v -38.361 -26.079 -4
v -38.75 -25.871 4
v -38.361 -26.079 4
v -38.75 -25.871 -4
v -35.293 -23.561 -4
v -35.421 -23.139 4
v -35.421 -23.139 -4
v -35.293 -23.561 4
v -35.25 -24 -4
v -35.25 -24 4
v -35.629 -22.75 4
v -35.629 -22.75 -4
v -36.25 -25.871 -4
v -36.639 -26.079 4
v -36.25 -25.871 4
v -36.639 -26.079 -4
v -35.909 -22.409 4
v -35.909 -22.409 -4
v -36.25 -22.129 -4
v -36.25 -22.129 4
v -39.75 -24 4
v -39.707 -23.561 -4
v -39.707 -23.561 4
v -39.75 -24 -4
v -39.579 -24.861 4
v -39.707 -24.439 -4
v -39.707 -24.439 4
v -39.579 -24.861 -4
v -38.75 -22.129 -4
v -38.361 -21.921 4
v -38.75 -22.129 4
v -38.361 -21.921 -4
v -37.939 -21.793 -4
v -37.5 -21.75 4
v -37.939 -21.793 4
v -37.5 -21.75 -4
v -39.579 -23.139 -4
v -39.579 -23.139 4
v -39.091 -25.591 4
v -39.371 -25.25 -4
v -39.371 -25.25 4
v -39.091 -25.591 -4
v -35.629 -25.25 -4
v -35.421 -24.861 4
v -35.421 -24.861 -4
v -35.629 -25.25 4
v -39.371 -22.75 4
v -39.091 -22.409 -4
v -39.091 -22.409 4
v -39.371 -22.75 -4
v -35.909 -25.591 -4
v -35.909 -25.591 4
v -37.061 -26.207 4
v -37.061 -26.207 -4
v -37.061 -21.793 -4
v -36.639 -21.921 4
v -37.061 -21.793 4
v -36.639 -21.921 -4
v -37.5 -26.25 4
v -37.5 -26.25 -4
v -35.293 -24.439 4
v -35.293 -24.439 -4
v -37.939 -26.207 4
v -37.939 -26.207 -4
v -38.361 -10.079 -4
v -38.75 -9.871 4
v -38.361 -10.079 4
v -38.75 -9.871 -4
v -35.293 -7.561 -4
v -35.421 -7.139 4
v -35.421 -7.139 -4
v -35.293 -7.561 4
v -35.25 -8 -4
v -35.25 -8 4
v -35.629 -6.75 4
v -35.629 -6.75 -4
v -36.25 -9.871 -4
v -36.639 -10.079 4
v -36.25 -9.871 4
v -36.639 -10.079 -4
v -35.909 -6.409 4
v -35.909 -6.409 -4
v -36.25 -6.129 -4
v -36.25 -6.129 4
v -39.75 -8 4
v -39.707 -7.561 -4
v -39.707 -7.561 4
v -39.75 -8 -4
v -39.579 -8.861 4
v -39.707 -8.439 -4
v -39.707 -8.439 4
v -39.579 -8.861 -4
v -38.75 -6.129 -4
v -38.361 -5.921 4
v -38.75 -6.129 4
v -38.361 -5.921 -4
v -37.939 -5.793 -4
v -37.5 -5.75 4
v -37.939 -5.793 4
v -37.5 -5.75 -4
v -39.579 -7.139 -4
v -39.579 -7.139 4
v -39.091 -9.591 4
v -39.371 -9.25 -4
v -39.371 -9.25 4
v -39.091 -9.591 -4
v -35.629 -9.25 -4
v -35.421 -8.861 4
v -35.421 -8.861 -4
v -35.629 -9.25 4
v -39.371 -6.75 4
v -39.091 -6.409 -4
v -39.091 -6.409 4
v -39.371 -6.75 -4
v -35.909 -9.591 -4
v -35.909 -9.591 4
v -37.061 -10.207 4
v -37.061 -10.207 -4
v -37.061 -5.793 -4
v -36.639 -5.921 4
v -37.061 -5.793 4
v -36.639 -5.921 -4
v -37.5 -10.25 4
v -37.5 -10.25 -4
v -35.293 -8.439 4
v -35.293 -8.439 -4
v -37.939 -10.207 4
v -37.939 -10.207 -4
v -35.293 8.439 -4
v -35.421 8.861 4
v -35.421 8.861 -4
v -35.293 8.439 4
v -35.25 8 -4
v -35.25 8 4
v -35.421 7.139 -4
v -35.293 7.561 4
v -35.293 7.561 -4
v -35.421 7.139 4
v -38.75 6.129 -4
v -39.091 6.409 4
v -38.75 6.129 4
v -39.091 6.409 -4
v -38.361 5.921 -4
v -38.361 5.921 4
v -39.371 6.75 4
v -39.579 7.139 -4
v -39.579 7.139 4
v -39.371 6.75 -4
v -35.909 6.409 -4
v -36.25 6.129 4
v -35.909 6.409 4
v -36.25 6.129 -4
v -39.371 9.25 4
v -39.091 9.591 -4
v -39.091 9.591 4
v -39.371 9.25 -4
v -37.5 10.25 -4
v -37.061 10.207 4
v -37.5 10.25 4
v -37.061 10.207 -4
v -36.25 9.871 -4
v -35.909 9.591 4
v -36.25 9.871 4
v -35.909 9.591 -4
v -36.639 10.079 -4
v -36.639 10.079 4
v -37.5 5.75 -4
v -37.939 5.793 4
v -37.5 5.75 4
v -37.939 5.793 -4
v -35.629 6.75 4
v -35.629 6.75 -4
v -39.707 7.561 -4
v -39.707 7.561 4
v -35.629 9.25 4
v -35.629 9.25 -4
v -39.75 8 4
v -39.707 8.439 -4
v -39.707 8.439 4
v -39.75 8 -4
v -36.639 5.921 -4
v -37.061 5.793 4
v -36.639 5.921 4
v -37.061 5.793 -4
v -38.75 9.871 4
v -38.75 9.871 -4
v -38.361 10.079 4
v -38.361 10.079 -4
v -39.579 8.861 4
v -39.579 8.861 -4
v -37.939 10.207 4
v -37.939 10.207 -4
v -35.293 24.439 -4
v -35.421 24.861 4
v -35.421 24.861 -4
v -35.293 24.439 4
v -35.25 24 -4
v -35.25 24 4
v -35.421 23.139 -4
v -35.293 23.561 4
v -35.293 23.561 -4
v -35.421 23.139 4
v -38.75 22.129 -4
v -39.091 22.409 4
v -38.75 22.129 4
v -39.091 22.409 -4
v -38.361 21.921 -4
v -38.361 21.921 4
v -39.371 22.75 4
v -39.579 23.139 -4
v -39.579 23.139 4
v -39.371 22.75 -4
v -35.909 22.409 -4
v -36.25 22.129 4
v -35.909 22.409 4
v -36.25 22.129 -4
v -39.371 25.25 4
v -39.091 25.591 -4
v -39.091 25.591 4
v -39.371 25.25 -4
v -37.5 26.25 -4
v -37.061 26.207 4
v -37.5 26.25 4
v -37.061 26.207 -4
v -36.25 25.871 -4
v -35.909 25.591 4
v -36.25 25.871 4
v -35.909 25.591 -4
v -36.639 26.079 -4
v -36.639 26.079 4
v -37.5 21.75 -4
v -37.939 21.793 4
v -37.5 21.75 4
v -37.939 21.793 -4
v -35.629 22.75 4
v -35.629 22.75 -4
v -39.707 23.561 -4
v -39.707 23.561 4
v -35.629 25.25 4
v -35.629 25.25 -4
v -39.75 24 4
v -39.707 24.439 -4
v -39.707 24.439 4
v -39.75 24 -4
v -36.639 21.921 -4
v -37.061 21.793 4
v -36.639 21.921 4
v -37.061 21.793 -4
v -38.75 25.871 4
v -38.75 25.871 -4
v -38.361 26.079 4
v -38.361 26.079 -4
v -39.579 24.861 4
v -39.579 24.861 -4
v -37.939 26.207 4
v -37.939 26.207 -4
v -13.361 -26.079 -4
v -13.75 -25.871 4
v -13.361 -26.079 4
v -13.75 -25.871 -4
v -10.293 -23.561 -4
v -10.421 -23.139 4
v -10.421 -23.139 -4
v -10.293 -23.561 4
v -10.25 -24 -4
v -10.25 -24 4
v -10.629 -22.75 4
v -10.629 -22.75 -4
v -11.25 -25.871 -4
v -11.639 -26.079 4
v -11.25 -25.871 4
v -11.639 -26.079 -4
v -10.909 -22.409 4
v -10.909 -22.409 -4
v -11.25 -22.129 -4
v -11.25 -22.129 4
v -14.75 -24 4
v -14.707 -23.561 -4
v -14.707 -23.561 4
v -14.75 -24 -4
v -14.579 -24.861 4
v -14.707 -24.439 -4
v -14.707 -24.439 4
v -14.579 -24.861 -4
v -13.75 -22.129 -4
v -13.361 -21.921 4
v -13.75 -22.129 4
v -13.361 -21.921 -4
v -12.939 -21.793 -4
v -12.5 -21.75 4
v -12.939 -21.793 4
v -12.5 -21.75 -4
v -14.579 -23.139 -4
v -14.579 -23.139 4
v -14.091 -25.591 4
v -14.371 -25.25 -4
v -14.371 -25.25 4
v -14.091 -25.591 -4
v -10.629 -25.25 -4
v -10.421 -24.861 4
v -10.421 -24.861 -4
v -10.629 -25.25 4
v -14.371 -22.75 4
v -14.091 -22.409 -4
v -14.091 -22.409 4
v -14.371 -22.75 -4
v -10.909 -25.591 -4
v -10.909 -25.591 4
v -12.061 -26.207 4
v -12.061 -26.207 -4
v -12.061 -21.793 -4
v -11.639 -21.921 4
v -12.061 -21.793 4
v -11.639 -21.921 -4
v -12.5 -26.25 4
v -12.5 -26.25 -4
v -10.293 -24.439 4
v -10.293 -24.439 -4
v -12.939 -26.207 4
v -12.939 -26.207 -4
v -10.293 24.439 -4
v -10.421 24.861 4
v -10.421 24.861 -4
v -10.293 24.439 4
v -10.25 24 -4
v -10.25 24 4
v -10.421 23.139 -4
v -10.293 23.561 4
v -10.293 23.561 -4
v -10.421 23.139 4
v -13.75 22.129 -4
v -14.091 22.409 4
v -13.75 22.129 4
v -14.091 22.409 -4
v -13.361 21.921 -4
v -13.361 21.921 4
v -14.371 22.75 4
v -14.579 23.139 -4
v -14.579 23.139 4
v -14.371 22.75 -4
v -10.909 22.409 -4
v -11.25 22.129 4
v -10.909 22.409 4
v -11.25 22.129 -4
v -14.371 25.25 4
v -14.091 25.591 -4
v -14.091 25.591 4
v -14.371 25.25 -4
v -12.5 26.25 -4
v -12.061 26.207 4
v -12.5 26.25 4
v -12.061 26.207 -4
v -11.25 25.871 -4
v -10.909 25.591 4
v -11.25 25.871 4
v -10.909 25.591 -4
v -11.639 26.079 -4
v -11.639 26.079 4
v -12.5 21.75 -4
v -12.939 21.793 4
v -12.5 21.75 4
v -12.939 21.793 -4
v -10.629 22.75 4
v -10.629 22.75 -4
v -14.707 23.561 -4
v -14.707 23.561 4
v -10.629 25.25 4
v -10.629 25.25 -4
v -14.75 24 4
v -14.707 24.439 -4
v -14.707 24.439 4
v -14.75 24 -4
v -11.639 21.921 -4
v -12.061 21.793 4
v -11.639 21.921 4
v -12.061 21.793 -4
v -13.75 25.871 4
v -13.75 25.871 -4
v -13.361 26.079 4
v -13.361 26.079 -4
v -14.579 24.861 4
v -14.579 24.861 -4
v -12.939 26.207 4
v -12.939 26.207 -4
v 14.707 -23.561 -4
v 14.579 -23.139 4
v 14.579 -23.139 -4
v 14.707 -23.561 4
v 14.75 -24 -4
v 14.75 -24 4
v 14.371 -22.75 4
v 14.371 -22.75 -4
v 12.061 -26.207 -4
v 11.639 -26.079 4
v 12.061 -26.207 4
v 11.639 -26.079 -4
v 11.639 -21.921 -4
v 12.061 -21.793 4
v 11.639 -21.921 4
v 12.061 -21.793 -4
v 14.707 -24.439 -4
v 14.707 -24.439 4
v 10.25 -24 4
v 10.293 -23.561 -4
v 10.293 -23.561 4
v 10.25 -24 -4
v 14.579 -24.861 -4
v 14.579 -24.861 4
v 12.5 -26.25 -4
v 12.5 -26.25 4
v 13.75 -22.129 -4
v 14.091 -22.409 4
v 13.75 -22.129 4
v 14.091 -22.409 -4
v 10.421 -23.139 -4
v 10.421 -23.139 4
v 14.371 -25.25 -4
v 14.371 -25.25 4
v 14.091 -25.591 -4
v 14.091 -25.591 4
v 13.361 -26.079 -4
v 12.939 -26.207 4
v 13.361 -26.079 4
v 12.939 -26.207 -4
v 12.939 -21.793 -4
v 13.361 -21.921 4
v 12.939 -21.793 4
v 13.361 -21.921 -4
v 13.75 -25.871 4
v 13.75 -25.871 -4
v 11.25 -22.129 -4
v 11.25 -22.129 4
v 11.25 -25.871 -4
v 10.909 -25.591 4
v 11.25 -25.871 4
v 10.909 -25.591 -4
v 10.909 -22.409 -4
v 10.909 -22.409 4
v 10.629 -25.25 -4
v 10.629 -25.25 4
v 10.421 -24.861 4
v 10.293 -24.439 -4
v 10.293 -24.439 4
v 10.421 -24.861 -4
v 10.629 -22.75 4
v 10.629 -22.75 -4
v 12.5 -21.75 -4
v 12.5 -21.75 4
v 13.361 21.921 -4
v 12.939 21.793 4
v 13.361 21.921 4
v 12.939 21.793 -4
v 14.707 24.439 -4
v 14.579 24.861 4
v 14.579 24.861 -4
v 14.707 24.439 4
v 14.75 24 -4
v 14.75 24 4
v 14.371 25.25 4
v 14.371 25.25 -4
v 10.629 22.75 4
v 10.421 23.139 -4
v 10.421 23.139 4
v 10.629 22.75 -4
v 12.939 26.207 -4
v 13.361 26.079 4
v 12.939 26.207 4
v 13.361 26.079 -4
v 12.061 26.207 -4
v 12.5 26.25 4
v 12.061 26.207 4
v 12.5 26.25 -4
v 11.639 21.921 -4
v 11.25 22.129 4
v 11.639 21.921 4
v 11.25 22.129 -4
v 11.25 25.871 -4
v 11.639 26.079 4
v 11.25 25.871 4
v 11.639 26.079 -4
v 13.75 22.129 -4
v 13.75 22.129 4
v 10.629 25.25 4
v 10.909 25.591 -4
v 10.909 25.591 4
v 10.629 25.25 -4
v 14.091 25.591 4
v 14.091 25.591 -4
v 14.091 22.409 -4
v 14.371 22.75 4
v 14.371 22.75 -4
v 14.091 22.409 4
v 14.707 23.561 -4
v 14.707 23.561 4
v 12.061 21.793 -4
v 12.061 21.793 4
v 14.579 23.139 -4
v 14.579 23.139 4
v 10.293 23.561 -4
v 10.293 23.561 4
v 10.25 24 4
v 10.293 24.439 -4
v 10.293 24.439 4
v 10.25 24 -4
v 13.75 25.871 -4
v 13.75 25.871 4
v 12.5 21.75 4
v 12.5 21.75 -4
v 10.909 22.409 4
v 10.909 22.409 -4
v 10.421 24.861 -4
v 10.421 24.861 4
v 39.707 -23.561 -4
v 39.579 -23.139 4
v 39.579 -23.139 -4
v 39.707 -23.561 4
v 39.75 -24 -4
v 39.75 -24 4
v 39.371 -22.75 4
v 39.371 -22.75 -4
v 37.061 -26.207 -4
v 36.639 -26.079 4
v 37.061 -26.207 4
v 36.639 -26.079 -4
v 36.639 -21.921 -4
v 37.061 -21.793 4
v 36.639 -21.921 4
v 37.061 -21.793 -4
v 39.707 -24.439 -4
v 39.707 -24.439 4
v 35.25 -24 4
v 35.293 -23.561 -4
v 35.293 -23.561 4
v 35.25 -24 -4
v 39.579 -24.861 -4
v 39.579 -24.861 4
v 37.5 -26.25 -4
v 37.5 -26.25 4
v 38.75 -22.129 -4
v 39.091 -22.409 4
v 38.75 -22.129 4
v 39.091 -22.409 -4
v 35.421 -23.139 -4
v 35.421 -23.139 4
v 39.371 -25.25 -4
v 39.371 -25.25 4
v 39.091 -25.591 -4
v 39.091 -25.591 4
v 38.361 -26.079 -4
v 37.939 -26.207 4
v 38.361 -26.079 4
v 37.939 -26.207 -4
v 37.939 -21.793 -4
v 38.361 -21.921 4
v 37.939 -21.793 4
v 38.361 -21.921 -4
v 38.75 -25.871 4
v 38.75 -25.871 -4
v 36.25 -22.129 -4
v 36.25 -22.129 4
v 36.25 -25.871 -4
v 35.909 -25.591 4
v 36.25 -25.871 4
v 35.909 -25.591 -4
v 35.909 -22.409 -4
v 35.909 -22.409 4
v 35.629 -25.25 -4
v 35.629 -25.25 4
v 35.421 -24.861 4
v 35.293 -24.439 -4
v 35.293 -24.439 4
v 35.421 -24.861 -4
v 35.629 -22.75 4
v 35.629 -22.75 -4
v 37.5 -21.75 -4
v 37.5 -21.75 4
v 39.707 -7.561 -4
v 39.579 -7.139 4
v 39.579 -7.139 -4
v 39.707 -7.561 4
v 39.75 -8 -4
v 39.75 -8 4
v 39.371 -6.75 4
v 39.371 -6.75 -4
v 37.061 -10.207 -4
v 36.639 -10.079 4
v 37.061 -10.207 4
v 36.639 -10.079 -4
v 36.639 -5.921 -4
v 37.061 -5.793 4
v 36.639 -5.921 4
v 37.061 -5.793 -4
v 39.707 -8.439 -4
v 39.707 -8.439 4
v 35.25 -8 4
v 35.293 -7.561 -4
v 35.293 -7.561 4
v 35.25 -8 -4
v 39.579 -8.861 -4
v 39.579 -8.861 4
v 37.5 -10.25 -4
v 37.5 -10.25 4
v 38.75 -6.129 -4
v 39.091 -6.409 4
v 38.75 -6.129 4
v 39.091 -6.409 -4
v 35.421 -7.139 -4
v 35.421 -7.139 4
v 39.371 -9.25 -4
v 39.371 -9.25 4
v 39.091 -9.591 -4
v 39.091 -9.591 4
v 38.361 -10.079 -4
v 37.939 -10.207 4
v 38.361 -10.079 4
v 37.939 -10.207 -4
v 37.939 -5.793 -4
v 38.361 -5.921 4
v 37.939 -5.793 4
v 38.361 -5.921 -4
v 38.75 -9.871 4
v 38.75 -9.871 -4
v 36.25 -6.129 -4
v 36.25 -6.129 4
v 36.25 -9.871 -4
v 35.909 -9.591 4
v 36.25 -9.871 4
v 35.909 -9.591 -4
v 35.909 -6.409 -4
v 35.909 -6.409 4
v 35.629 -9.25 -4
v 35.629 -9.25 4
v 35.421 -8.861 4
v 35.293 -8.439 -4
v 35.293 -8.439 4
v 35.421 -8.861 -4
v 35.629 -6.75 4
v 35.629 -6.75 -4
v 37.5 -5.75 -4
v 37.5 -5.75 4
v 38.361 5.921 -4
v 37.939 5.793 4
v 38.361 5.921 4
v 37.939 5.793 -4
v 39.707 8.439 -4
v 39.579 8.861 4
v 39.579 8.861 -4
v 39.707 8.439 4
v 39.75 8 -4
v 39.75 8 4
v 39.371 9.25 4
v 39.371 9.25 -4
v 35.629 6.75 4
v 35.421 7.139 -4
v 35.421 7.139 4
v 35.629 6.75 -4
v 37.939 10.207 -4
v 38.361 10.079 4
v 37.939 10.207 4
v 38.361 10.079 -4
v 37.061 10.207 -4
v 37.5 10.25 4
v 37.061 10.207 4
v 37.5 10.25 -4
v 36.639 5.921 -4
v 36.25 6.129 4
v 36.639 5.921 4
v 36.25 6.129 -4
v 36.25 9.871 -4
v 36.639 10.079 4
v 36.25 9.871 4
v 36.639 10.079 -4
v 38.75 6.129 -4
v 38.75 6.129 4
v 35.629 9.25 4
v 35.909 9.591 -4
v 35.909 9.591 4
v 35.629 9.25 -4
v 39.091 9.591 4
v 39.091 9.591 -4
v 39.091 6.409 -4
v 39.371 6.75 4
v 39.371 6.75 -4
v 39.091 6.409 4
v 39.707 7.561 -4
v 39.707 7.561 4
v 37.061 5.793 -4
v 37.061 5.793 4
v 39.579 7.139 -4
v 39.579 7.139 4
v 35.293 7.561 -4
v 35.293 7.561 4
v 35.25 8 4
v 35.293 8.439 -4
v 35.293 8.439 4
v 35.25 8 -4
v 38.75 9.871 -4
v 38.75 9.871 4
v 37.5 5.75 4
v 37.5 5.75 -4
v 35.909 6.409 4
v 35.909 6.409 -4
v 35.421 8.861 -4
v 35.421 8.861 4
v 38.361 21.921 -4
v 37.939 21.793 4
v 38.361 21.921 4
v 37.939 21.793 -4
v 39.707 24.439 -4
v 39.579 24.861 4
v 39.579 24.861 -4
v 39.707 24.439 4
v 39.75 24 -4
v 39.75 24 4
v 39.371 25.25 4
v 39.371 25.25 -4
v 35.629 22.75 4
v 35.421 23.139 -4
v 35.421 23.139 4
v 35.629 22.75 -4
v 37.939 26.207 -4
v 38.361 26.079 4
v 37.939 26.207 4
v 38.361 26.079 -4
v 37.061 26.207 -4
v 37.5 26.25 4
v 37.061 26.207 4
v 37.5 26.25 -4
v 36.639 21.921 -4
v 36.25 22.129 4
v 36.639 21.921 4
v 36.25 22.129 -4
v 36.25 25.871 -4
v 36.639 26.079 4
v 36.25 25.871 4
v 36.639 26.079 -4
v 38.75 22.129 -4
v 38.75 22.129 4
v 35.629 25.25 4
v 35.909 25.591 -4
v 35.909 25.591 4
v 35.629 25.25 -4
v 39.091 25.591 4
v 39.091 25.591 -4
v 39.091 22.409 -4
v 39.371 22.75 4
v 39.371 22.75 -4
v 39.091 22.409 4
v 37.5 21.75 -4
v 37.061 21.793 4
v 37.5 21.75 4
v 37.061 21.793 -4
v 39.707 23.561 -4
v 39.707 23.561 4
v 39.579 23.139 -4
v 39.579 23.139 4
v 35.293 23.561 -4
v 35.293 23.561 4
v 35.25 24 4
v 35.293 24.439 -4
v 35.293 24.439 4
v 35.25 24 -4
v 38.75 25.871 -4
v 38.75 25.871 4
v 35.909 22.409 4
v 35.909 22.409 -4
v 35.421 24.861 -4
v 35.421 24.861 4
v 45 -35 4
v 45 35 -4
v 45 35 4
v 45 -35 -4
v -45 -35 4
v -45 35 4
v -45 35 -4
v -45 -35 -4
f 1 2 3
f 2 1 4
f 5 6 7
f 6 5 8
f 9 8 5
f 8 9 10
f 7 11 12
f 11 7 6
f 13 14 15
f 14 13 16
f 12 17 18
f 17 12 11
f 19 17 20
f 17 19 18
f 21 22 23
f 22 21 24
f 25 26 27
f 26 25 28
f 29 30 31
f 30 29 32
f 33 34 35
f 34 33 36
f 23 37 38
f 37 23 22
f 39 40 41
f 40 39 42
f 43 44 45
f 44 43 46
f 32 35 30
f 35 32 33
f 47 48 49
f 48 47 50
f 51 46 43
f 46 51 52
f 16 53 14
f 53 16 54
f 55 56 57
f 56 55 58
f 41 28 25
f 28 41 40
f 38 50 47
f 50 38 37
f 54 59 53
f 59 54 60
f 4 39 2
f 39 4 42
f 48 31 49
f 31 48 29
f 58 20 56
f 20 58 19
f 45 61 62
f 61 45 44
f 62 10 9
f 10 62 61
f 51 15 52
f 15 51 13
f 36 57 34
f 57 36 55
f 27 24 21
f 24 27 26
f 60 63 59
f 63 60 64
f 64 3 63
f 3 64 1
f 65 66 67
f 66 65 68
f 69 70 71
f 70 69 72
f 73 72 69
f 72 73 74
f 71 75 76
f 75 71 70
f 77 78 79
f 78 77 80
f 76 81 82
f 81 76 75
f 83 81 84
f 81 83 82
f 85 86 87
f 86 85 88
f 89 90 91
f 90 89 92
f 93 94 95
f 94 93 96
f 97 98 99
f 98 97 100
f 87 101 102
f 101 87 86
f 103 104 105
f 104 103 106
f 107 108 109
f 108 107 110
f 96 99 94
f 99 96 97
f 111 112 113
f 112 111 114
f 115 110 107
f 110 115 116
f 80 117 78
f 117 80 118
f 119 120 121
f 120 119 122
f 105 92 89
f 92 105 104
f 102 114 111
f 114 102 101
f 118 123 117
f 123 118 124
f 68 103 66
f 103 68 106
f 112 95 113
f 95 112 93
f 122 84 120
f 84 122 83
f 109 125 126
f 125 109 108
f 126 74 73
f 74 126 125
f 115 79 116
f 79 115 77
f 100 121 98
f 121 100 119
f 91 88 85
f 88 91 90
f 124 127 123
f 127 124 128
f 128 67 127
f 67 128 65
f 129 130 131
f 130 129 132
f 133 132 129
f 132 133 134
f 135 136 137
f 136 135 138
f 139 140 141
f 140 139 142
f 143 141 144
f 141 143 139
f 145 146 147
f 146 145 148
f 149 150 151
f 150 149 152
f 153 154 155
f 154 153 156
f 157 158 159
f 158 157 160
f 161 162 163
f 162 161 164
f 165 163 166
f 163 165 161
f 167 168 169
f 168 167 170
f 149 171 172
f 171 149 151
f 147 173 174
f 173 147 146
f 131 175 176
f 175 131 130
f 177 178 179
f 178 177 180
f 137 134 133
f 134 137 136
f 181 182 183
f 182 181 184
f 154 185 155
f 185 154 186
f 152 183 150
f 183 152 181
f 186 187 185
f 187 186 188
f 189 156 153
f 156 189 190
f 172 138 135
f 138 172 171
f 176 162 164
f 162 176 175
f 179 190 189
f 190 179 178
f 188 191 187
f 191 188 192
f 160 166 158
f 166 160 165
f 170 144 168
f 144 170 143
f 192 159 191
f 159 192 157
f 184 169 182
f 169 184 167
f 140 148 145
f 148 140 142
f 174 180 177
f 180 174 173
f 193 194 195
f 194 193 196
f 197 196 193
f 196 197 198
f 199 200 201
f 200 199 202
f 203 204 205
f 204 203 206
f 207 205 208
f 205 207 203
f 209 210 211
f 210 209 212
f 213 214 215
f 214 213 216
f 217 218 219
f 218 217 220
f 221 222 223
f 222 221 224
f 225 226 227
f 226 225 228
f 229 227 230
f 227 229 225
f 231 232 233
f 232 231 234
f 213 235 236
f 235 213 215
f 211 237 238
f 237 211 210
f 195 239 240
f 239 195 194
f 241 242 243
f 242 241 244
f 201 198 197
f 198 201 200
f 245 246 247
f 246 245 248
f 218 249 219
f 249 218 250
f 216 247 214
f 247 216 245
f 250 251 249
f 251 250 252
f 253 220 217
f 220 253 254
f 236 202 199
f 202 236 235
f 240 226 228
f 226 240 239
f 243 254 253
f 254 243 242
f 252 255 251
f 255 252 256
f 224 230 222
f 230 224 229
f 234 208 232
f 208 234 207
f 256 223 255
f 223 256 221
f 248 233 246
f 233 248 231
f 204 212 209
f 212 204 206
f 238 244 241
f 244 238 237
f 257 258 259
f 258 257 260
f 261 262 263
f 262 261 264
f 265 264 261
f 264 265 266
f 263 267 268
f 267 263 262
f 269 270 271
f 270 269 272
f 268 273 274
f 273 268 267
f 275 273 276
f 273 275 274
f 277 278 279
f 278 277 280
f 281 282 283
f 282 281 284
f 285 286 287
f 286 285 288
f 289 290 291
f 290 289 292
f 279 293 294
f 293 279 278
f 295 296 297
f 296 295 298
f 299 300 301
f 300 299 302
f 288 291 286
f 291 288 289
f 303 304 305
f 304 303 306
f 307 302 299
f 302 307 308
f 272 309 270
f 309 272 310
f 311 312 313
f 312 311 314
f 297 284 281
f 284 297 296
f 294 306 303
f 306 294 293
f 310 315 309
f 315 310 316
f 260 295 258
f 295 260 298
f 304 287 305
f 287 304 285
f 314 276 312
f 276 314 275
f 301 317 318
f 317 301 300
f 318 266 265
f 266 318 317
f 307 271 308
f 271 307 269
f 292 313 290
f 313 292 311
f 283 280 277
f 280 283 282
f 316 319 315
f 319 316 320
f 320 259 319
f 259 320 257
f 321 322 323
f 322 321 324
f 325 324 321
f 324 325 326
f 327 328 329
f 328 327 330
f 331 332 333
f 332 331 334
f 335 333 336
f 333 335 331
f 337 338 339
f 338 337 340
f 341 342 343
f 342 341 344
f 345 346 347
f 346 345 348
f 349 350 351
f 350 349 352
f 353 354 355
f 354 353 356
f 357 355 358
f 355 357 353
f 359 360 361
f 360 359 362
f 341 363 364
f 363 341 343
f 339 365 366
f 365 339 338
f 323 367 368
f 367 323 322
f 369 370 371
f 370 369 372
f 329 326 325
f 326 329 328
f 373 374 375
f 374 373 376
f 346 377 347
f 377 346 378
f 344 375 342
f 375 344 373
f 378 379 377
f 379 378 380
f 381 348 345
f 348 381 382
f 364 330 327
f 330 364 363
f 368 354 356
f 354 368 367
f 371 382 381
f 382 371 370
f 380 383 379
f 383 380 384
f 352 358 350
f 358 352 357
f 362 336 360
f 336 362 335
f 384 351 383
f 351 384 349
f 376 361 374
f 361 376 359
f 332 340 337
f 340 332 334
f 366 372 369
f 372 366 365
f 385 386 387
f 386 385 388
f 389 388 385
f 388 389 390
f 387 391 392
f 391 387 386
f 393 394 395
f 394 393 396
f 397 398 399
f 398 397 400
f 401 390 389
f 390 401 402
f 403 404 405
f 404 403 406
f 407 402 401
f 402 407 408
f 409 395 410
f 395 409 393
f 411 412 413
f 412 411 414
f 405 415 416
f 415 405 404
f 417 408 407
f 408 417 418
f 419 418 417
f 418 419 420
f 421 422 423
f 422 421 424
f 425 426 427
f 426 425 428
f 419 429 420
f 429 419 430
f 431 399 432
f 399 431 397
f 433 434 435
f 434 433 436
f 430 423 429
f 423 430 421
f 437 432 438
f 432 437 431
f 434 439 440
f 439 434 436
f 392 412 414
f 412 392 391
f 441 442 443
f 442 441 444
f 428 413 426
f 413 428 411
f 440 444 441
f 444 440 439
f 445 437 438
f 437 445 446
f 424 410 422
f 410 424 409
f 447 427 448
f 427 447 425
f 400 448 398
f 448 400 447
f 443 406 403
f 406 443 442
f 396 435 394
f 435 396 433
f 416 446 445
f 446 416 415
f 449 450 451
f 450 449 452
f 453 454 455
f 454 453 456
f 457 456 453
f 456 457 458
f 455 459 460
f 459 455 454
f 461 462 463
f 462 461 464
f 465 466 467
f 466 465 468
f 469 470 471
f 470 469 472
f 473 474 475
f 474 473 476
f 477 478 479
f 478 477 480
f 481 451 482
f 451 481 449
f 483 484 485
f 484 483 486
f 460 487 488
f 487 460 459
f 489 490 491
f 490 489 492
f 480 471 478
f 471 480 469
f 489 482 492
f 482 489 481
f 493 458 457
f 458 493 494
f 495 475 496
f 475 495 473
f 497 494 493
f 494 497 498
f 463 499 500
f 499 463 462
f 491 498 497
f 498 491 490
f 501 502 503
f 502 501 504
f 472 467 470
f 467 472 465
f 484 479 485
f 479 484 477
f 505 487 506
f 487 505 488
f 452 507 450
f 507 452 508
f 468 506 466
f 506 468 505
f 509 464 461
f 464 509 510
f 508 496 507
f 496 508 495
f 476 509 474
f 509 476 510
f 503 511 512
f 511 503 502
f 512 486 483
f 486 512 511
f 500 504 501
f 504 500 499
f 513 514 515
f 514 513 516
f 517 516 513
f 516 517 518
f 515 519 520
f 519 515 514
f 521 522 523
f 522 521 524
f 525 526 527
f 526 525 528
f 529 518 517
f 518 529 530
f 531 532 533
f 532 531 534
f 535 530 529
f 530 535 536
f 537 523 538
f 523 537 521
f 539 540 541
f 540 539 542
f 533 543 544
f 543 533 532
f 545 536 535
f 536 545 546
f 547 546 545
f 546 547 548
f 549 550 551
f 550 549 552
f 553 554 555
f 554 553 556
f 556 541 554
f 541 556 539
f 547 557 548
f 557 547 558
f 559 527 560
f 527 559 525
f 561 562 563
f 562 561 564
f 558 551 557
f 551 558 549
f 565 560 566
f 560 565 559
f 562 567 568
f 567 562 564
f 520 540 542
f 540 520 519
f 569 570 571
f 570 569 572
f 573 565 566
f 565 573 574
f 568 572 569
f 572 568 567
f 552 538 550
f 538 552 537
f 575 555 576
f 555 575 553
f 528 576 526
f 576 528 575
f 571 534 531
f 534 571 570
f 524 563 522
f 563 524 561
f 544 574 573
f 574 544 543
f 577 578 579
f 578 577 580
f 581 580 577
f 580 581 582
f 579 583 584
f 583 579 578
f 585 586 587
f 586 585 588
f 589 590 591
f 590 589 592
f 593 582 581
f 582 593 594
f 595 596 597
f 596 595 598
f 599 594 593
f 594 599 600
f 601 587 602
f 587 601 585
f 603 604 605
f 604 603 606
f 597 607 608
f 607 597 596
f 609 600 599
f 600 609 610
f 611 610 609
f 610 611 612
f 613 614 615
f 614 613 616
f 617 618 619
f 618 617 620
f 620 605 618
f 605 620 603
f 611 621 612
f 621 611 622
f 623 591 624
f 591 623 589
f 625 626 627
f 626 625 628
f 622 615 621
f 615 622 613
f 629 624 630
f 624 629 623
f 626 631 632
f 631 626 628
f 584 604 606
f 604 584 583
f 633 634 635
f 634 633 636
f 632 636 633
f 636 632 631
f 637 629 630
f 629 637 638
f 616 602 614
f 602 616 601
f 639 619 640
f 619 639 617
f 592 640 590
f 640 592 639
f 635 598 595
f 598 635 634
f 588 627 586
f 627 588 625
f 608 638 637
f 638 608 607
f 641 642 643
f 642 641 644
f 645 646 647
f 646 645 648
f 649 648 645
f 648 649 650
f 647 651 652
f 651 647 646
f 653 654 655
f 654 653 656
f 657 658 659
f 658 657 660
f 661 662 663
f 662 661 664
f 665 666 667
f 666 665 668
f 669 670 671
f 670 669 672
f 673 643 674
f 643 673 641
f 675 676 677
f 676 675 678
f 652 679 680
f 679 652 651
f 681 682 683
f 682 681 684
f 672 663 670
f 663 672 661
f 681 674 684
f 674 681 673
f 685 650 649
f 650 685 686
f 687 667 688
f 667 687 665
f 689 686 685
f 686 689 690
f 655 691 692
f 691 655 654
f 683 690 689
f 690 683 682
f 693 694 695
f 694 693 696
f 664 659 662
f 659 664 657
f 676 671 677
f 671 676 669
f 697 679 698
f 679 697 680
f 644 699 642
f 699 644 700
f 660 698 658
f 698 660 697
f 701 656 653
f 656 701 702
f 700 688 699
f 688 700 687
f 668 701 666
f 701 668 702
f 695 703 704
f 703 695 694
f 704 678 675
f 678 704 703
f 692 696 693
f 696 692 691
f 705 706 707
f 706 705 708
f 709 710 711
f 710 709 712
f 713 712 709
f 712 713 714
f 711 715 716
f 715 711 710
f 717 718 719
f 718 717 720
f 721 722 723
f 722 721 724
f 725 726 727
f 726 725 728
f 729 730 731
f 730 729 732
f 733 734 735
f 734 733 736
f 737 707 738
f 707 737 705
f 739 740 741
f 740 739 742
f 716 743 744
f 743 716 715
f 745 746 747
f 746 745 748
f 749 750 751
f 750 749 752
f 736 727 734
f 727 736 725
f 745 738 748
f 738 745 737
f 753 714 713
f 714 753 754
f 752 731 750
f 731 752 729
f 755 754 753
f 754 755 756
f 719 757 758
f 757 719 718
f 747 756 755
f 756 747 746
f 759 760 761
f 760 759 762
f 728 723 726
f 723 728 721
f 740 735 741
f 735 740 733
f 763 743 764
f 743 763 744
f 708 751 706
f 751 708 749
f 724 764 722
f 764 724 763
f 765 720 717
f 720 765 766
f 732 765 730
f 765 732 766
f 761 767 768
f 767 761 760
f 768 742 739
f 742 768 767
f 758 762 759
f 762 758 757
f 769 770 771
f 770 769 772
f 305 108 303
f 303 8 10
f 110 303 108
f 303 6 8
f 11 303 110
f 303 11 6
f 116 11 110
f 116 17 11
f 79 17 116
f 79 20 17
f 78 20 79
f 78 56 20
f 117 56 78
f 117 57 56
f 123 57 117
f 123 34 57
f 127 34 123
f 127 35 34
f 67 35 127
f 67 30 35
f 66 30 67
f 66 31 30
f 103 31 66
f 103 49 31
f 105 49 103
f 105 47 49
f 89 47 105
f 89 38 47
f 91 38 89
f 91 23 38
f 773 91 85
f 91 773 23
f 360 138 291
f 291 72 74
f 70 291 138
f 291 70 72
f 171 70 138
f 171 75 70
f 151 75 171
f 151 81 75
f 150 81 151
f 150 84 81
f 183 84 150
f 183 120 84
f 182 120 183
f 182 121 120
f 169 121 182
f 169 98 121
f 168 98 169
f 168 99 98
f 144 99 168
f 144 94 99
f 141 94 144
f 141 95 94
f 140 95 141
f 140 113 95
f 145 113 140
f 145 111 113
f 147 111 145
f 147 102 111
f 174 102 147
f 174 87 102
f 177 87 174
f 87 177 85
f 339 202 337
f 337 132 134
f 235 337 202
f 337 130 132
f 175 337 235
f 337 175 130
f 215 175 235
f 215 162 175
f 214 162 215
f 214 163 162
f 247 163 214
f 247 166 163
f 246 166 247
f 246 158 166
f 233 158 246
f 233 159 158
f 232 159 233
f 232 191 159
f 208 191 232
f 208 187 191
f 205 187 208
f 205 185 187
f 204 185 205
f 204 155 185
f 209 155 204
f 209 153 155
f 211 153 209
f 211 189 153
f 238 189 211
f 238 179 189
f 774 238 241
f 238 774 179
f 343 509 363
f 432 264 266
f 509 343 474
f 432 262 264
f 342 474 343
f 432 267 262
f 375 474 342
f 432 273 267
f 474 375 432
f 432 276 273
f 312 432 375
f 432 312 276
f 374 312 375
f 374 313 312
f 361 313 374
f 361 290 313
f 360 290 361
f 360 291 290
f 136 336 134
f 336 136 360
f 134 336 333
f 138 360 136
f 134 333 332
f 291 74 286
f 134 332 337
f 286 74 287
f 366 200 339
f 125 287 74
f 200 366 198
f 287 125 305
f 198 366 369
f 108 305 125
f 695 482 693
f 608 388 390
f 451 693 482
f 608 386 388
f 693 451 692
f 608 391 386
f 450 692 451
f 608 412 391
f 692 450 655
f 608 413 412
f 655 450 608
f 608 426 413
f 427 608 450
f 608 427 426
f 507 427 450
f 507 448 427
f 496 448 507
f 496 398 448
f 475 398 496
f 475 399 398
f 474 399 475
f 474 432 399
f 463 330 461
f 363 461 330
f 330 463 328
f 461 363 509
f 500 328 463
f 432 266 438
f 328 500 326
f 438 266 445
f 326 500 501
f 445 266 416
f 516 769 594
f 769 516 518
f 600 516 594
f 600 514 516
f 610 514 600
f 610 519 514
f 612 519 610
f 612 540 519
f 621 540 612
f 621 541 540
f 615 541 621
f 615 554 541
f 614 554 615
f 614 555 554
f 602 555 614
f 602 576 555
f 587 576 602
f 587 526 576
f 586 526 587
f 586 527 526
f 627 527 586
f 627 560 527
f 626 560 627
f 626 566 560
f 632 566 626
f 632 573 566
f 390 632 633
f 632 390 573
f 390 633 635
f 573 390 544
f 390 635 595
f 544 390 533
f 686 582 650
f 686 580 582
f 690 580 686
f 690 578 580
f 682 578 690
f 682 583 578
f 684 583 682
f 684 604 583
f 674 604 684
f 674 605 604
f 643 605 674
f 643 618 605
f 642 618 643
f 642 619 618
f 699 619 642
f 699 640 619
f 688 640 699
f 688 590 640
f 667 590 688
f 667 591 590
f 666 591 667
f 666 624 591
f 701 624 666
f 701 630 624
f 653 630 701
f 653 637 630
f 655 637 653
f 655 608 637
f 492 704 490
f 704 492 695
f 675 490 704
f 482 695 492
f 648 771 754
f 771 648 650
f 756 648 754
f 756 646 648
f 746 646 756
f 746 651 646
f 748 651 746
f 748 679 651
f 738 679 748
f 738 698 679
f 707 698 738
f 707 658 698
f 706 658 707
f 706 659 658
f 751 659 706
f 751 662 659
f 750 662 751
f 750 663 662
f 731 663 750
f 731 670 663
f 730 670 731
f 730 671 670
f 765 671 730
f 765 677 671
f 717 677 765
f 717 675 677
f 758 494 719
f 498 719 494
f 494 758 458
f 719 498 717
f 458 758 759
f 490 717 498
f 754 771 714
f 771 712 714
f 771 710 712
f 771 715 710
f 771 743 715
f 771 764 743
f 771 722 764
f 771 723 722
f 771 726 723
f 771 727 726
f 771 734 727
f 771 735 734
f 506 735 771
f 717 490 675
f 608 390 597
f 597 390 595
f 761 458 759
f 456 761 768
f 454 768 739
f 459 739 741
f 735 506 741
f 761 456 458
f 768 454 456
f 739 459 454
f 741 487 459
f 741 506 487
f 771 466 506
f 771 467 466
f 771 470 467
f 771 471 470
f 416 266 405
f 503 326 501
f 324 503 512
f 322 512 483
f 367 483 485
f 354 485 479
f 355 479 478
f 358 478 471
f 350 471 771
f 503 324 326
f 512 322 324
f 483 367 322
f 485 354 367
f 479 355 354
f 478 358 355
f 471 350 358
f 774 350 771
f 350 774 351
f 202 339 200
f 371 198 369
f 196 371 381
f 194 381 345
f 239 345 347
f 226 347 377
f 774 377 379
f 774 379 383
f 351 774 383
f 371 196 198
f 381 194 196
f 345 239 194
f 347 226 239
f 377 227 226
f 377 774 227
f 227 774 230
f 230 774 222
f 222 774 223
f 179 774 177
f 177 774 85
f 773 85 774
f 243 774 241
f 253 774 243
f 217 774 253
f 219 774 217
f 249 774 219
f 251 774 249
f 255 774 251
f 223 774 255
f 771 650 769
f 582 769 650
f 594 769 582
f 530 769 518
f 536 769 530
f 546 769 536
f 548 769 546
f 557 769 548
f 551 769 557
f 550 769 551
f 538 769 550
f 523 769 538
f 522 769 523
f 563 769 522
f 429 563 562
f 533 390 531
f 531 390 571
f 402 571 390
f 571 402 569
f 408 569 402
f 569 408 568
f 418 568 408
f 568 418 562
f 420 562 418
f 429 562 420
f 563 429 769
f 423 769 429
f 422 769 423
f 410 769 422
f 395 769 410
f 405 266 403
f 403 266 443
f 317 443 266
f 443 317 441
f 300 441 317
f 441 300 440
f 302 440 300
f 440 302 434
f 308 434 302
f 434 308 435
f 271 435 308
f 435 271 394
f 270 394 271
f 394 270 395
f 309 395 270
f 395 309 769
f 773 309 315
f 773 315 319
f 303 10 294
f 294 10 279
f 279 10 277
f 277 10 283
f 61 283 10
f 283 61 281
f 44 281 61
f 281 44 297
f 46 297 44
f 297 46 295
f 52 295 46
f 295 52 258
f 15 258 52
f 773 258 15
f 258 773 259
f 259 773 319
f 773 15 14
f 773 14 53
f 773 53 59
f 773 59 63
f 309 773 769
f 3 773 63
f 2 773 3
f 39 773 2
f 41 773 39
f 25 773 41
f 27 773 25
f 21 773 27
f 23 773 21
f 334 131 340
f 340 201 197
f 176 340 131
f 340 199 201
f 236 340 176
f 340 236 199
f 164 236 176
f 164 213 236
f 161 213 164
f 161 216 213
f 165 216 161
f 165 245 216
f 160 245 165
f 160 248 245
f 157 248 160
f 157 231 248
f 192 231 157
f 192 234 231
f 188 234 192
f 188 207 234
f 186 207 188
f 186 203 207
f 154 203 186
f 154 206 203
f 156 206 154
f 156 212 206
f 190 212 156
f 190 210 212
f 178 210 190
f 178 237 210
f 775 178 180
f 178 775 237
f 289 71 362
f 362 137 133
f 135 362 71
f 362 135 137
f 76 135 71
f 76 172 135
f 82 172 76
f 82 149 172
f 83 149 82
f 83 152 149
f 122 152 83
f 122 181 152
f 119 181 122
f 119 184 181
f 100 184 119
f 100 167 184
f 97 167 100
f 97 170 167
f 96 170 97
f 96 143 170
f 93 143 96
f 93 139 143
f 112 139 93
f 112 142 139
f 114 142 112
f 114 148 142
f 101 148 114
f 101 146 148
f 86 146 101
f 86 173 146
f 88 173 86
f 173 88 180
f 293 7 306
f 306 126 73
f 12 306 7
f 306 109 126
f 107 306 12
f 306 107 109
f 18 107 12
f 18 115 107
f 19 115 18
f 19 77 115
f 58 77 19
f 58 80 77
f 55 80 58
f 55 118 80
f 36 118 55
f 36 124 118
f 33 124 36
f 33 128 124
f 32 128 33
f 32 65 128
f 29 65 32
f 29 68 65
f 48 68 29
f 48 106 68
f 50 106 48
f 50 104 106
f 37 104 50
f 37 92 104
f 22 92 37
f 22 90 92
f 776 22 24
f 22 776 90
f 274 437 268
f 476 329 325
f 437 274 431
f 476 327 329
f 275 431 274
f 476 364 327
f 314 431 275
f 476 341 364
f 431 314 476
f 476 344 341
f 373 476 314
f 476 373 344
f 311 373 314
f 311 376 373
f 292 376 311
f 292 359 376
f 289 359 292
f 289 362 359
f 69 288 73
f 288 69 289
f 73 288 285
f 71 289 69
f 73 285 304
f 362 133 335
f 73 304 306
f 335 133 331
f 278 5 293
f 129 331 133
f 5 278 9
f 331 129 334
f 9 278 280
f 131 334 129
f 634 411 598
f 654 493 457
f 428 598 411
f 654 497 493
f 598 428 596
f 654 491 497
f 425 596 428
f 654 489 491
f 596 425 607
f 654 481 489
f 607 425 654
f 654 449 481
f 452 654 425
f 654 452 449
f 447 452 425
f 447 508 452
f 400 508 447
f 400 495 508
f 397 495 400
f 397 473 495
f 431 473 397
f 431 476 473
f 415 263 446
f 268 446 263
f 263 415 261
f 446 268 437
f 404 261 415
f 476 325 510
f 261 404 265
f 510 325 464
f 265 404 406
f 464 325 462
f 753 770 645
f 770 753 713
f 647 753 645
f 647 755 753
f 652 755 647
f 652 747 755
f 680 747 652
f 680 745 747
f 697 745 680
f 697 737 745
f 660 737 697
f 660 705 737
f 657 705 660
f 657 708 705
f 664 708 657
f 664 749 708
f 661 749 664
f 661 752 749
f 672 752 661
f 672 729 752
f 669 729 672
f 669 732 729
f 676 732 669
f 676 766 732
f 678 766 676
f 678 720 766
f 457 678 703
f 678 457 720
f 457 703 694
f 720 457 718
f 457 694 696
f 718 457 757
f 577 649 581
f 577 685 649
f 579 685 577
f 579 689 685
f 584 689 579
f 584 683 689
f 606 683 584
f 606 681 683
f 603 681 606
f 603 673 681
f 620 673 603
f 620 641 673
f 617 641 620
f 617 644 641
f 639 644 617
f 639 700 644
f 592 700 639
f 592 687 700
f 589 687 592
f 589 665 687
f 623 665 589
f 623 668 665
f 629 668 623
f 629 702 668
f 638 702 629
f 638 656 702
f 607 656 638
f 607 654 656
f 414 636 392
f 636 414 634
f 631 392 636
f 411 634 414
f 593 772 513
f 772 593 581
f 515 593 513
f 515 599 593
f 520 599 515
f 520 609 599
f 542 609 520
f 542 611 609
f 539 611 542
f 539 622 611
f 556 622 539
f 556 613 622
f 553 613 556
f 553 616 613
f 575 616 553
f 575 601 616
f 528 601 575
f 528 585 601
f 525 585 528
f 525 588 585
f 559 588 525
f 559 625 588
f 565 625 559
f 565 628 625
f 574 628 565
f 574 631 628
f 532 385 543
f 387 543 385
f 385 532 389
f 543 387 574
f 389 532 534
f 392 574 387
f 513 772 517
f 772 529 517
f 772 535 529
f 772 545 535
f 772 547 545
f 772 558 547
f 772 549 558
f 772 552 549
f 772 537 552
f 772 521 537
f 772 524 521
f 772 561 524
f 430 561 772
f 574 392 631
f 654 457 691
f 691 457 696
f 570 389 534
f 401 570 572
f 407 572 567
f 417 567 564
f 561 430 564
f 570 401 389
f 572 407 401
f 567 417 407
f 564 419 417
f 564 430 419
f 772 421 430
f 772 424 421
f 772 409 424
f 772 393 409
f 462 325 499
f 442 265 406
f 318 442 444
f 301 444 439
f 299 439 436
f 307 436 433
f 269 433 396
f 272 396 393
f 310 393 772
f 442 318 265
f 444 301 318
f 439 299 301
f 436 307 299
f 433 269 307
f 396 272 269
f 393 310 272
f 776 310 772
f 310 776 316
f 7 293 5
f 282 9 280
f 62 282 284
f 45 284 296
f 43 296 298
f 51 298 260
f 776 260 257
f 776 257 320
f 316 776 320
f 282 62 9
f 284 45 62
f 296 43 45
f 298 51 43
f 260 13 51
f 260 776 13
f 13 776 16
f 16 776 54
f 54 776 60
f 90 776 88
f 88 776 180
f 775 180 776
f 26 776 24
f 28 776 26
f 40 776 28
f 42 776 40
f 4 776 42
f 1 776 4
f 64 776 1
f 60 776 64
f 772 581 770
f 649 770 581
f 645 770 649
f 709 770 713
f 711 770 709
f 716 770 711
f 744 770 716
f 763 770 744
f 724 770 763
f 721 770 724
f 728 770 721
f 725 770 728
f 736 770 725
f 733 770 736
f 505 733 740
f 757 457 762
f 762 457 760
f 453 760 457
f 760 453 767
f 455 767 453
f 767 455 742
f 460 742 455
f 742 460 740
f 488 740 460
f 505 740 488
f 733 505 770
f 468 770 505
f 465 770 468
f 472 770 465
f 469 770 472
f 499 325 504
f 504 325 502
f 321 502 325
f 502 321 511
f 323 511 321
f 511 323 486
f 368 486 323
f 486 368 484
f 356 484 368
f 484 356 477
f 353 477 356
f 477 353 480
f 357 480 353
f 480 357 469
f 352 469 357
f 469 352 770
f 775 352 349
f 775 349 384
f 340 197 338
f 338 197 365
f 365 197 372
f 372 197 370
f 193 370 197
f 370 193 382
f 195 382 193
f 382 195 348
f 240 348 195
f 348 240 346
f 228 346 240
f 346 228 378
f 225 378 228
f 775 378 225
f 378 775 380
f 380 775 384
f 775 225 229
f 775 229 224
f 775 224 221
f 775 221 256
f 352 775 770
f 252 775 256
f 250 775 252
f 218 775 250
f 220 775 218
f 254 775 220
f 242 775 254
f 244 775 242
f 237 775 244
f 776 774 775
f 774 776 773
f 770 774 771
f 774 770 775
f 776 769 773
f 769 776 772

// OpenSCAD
$fn = 32;

// ----------------------------------------------------------------------
// Perforated panel 90 x 70 x 8
// 4 x 4 Ø4.5 holes, frame layout
// ----------------------------------------------------------------------

// --- parameters (mm) ---
panel = [90, 70, 8];  // overall size (x, y, z)
hole_d = 4.5;         // hole diameter
pitch_x = 25;         // hole pitch along X
pitch_y = 16;         // hole pitch along Y

// --- derived feature positions (mm) ---
margin = hole_d / 2 + 2;            // = 4.25   clearance from the panel edge
cols = floor((panel[0] - 2 * margin) / pitch_x) + 1;  // = 4   how many columns fit in X
rows = floor((panel[1] - 2 * margin) / pitch_y) + 1;  // = 4   how many rows fit in Y
span_x = (cols - 1) * pitch_x + 0;  // = 75   width of the field
span_y = (rows - 1) * pitch_y;      // = 48   height of the field
origin_x = -span_x / 2;             // = -37.5   X of the first hole
origin_y = -span_y / 2;             // = -24   Y of the first row
holes = 2 * cols + 2 * (rows - 2);  // = 12   holes around the frame
feature_centers = [
  [origin_x + 0 * pitch_x, origin_y + 0 * pitch_y],
  [origin_x + 0 * pitch_x, origin_y + 1 * pitch_y],
  [origin_x + 0 * pitch_x, origin_y + 2 * pitch_y],
  [origin_x + 0 * pitch_x, origin_y + 3 * pitch_y],
  [origin_x + 1 * pitch_x, origin_y + 0 * pitch_y],
  [origin_x + 1 * pitch_x, origin_y + 3 * pitch_y],
  [origin_x + 2 * pitch_x, origin_y + 0 * pitch_y],
  [origin_x + 2 * pitch_x, origin_y + 3 * pitch_y],
  [origin_x + 3 * pitch_x, origin_y + 0 * pitch_y],
  [origin_x + 3 * pitch_x, origin_y + 1 * pitch_y],
  [origin_x + 3 * pitch_x, origin_y + 2 * pitch_y],
  [origin_x + 3 * pitch_x, origin_y + 3 * pitch_y]
];   // hole centres, used verbatim by the cutter loop

// panel outline, every hole through
difference() {
  cube(panel, center = true);
  for (centre = feature_centers)
    translate([centre[0], centre[1], 0])
      cylinder(d = hole_d, h = panel[2] + 2, center = true);
}
